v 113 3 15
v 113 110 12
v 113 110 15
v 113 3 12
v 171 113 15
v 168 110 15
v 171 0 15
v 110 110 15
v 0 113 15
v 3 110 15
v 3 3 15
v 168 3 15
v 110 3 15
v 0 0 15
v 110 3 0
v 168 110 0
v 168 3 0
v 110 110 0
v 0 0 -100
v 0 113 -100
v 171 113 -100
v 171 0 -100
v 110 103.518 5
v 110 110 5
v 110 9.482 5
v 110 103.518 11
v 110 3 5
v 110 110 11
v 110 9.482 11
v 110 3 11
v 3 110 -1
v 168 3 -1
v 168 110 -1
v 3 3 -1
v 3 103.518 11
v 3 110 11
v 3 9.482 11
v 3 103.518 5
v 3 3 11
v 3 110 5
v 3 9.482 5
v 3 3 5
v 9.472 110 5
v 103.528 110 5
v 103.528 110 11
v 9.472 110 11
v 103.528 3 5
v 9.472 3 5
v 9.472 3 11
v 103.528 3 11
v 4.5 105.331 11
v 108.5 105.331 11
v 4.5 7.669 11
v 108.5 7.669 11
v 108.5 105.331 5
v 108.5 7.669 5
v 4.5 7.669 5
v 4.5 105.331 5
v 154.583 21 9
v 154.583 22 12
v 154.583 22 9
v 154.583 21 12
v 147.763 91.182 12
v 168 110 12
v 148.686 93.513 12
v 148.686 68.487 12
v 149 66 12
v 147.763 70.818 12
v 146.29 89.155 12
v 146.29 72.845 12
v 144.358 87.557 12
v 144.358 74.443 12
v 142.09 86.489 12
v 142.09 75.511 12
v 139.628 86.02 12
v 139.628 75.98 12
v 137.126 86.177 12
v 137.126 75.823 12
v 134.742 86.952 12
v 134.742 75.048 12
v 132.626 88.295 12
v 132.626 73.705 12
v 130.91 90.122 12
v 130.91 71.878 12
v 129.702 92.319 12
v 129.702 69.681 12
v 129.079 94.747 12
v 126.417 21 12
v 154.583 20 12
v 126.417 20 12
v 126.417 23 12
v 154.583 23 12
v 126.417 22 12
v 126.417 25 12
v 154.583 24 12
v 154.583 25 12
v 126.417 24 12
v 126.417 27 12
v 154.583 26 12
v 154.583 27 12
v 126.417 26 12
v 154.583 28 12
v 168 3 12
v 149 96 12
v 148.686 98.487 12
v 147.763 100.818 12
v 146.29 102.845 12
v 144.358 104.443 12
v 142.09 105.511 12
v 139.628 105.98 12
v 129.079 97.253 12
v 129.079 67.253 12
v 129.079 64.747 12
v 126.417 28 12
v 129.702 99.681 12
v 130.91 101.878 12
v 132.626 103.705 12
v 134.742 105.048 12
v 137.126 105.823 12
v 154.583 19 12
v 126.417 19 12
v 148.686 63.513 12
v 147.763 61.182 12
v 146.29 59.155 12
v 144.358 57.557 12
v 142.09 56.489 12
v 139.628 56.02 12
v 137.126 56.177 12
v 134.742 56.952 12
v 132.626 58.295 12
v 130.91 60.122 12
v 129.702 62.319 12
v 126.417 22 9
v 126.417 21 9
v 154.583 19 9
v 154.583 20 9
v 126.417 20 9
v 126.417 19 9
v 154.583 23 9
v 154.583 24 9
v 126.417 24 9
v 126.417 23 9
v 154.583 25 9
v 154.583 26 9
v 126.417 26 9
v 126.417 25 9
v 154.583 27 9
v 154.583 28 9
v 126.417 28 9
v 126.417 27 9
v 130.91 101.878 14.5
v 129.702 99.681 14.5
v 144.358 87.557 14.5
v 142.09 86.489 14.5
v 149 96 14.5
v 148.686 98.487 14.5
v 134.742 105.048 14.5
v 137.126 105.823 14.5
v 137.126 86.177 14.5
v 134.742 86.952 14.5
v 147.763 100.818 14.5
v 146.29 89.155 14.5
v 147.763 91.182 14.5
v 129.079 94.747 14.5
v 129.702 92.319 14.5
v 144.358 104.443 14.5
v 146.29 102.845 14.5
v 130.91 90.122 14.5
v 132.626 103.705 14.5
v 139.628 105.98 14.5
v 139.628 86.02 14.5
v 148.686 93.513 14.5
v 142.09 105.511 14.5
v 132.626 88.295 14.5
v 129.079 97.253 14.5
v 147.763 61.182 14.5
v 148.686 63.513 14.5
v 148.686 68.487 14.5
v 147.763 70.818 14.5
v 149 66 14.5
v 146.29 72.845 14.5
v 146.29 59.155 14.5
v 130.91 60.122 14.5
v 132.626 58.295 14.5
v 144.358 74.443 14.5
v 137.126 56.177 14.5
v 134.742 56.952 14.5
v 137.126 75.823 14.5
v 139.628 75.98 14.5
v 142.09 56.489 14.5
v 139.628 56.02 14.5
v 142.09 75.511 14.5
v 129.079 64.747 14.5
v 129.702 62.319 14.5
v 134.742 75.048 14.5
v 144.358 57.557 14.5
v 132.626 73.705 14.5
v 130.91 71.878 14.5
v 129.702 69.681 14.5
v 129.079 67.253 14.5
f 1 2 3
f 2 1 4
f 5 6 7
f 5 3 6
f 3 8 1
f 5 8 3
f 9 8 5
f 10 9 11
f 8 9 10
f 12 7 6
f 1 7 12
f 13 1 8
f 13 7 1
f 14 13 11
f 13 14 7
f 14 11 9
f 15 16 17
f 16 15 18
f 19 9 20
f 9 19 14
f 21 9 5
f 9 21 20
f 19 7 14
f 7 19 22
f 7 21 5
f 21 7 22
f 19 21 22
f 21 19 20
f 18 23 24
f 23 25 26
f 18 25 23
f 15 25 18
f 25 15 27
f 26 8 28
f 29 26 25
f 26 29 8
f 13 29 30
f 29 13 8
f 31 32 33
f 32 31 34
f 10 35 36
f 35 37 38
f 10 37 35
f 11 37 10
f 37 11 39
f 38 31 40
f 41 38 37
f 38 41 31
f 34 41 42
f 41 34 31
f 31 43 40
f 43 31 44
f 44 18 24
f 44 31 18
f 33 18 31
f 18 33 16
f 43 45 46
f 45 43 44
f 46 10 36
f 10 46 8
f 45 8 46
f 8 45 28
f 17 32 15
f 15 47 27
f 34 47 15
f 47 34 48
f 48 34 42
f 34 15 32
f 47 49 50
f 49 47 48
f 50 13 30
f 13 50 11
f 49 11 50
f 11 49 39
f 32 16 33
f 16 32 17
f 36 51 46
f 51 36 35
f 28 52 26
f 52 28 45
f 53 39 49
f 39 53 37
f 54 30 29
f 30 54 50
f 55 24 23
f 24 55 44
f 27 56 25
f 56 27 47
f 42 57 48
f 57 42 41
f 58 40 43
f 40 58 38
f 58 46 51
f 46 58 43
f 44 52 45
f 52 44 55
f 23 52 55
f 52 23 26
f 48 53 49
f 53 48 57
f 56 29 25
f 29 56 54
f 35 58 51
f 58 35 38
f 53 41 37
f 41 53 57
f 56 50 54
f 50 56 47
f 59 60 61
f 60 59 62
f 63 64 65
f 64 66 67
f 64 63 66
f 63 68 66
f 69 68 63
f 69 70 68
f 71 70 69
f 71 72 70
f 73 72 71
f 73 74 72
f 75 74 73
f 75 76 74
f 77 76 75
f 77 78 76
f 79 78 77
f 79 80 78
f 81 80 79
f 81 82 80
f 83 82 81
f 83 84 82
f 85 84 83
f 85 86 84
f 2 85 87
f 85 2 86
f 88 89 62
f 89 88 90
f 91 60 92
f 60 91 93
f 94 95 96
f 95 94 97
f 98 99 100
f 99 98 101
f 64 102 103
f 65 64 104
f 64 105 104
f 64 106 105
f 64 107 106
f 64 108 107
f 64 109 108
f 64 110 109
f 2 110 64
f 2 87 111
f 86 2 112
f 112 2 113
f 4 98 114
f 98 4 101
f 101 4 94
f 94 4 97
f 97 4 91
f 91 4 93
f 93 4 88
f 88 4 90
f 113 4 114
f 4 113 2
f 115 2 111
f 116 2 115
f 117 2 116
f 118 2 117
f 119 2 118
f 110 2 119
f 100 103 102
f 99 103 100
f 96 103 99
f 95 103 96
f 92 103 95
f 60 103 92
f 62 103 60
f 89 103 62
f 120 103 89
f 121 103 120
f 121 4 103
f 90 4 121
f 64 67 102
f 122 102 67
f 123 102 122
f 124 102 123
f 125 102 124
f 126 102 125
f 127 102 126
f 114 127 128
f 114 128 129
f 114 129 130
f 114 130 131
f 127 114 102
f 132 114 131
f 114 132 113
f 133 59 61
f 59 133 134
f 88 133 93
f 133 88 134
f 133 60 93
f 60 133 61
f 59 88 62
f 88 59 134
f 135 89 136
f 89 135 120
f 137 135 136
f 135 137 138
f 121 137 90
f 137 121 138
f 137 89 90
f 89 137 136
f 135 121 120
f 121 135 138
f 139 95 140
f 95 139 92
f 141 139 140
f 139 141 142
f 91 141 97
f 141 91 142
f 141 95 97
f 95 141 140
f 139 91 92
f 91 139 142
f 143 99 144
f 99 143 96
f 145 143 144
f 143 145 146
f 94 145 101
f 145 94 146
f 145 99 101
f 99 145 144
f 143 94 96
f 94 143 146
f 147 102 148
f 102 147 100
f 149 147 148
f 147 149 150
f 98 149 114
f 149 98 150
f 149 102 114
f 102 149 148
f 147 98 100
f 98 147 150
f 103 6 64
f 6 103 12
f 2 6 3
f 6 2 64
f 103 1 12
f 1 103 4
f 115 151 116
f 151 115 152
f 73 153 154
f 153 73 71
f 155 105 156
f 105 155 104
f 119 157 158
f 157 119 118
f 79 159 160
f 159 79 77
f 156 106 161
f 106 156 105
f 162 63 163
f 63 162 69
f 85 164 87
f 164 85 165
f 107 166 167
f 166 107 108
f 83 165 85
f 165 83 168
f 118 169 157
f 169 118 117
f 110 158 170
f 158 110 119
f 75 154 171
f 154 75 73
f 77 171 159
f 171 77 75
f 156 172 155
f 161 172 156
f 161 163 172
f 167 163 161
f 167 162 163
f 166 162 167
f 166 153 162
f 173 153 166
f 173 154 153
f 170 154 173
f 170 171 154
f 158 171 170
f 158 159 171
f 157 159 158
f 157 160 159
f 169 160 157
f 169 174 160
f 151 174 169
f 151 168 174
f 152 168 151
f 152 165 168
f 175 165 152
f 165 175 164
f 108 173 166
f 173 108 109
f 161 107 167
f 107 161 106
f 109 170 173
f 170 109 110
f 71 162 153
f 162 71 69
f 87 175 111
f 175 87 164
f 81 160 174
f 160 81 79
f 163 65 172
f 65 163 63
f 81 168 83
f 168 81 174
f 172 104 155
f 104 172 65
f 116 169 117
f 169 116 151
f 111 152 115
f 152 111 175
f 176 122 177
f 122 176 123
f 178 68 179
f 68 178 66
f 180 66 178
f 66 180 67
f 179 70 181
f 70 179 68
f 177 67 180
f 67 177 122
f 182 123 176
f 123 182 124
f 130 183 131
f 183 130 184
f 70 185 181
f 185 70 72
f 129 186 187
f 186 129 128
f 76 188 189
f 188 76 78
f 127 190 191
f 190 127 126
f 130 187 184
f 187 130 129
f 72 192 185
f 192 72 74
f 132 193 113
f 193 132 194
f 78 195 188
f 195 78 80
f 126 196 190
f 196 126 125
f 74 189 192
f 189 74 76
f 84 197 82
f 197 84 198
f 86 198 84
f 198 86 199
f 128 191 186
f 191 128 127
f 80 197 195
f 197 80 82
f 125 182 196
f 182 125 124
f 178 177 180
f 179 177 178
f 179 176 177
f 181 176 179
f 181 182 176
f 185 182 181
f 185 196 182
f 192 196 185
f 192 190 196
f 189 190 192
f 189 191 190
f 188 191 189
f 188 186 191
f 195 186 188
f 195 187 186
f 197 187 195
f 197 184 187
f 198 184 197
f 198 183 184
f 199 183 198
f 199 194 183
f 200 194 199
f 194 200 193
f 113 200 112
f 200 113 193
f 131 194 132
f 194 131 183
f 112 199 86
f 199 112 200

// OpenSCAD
// TODO: Get actual measurements of the LCD
LCD_LENGTH = 165;   // just a guess
LCD_WIDTH = 107;    // just a guess
LCD_DEPTH = 5;      // just a guess

// replace CARD with LCD
CARD_LENGTH = LCD_WIDTH; //LCD_LENGTH; //51;
CARD_WIDTH = LCD_WIDTH; //51;
CARD_DEPTH = LCD_DEPTH; //3;

BORDER = 3;
KNOB_DIAMETER = 10;

difference(){
    
    // Console
    union(){
        cube([CARD_LENGTH+(BORDER*2), CARD_WIDTH+(BORDER*2), CARD_DEPTH*3]);
        
        translate([0,0,-100]){
            cube([LCD_LENGTH+(BORDER*2), LCD_WIDTH+(BORDER*2), 100]);
        }
    
        /*
        // This is a lazy way to make it thicker but will work for now
        translate([0,0,-CARD_DEPTH*3]){
            #cube([CARD_LENGTH+(BORDER*2), CARD_WIDTH+(BORDER*2), CARD_DEPTH*3]);
            translate([CARD_LENGTH+BORDER,0,0]){
                #cube([CARD_LENGTH/3, CARD_WIDTH+(BORDER*2), CARD_DEPTH*3]);
            }
        }
        */
    
    }
    
    /*
    // Card opening
    translate([0,BORDER,BORDER]){
        #cube([CARD_LENGTH,CARD_WIDTH,CARD_DEPTH]);
    }
    */
    
    translate([BORDER,BORDER,-1]){
    
        // overall screen cutout
        cube([CARD_LENGTH,CARD_WIDTH,CARD_DEPTH*4]);

        // Frame cutout
        translate([0,0,CARD_DEPTH]){
            cube([CARD_LENGTH,CARD_WIDTH,CARD_DEPTH*2]);
        }
        
        // LCD cutout
        cube([LCD_LENGTH, LCD_WIDTH, LCD_DEPTH]);
    }
}

// Frame corners
translate([0,0,CARD_DEPTH]){
    difference(){
        cube([CARD_LENGTH+(BORDER*2), CARD_WIDTH+(BORDER*2), CARD_DEPTH+1]);
        translate([BORDER,BORDER,0]){
            // View cutout            
            translate([CARD_LENGTH/2,CARD_LENGTH/2,-1]){
                cylinder(r=CARD_LENGTH/1.5,h=CARD_DEPTH+3,$fn=50);
            }            
        }
    }
}

// Controls
translate([CARD_LENGTH+BORDER,0,0]){
    difference(){
        cube([LCD_LENGTH-LCD_WIDTH+BORDER, CARD_WIDTH+(BORDER*2), CARD_DEPTH*3]);
        
        // Frame cutout
        translate([BORDER,BORDER,(CARD_DEPTH*2)+BORDER-1]){
            cube([(LCD_LENGTH-LCD_WIDTH)-(BORDER),CARD_WIDTH,CARD_DEPTH]);
            
            // Speaker grille
            translate([(((LCD_LENGTH-LCD_WIDTH)-(BORDER))/2)-(((CARD_LENGTH/3)-BORDER*2.5)/2),(CARD_WIDTH-BORDER)-(KNOB_DIAMETER*8),-BORDER]){
                #cube([(CARD_LENGTH/3)-BORDER*2.5,1,BORDER]);
                translate([0,-2,0]){
                    #cube([(CARD_LENGTH/3)-BORDER*2.5,1,BORDER]);
                    translate([0,-2,0]){
                        #cube([(CARD_LENGTH/3)-BORDER*2.5,1,BORDER]);
                        translate([0,-2,0]){
                            #cube([(CARD_LENGTH/3)-BORDER*2.5,1,BORDER]);
                            translate([0,-2,0]){
                                #cube([(CARD_LENGTH/3)-BORDER*2.5,1,BORDER]);
                            }
                        }
                    }
                }
            }
        }
    }
    
    // Knobs
    translate([((LCD_LENGTH-LCD_WIDTH)/2),CARD_WIDTH-(KNOB_DIAMETER/2)-(BORDER*2),(CARD_DEPTH*2)+BORDER-1.5]){
        cylinder(r=KNOB_DIAMETER,h=BORDER,$fn=25);
        translate([0,-KNOB_DIAMETER*3,0]){
            cylinder(r=KNOB_DIAMETER,h=BORDER,$fn=25);
        }
    }
}
